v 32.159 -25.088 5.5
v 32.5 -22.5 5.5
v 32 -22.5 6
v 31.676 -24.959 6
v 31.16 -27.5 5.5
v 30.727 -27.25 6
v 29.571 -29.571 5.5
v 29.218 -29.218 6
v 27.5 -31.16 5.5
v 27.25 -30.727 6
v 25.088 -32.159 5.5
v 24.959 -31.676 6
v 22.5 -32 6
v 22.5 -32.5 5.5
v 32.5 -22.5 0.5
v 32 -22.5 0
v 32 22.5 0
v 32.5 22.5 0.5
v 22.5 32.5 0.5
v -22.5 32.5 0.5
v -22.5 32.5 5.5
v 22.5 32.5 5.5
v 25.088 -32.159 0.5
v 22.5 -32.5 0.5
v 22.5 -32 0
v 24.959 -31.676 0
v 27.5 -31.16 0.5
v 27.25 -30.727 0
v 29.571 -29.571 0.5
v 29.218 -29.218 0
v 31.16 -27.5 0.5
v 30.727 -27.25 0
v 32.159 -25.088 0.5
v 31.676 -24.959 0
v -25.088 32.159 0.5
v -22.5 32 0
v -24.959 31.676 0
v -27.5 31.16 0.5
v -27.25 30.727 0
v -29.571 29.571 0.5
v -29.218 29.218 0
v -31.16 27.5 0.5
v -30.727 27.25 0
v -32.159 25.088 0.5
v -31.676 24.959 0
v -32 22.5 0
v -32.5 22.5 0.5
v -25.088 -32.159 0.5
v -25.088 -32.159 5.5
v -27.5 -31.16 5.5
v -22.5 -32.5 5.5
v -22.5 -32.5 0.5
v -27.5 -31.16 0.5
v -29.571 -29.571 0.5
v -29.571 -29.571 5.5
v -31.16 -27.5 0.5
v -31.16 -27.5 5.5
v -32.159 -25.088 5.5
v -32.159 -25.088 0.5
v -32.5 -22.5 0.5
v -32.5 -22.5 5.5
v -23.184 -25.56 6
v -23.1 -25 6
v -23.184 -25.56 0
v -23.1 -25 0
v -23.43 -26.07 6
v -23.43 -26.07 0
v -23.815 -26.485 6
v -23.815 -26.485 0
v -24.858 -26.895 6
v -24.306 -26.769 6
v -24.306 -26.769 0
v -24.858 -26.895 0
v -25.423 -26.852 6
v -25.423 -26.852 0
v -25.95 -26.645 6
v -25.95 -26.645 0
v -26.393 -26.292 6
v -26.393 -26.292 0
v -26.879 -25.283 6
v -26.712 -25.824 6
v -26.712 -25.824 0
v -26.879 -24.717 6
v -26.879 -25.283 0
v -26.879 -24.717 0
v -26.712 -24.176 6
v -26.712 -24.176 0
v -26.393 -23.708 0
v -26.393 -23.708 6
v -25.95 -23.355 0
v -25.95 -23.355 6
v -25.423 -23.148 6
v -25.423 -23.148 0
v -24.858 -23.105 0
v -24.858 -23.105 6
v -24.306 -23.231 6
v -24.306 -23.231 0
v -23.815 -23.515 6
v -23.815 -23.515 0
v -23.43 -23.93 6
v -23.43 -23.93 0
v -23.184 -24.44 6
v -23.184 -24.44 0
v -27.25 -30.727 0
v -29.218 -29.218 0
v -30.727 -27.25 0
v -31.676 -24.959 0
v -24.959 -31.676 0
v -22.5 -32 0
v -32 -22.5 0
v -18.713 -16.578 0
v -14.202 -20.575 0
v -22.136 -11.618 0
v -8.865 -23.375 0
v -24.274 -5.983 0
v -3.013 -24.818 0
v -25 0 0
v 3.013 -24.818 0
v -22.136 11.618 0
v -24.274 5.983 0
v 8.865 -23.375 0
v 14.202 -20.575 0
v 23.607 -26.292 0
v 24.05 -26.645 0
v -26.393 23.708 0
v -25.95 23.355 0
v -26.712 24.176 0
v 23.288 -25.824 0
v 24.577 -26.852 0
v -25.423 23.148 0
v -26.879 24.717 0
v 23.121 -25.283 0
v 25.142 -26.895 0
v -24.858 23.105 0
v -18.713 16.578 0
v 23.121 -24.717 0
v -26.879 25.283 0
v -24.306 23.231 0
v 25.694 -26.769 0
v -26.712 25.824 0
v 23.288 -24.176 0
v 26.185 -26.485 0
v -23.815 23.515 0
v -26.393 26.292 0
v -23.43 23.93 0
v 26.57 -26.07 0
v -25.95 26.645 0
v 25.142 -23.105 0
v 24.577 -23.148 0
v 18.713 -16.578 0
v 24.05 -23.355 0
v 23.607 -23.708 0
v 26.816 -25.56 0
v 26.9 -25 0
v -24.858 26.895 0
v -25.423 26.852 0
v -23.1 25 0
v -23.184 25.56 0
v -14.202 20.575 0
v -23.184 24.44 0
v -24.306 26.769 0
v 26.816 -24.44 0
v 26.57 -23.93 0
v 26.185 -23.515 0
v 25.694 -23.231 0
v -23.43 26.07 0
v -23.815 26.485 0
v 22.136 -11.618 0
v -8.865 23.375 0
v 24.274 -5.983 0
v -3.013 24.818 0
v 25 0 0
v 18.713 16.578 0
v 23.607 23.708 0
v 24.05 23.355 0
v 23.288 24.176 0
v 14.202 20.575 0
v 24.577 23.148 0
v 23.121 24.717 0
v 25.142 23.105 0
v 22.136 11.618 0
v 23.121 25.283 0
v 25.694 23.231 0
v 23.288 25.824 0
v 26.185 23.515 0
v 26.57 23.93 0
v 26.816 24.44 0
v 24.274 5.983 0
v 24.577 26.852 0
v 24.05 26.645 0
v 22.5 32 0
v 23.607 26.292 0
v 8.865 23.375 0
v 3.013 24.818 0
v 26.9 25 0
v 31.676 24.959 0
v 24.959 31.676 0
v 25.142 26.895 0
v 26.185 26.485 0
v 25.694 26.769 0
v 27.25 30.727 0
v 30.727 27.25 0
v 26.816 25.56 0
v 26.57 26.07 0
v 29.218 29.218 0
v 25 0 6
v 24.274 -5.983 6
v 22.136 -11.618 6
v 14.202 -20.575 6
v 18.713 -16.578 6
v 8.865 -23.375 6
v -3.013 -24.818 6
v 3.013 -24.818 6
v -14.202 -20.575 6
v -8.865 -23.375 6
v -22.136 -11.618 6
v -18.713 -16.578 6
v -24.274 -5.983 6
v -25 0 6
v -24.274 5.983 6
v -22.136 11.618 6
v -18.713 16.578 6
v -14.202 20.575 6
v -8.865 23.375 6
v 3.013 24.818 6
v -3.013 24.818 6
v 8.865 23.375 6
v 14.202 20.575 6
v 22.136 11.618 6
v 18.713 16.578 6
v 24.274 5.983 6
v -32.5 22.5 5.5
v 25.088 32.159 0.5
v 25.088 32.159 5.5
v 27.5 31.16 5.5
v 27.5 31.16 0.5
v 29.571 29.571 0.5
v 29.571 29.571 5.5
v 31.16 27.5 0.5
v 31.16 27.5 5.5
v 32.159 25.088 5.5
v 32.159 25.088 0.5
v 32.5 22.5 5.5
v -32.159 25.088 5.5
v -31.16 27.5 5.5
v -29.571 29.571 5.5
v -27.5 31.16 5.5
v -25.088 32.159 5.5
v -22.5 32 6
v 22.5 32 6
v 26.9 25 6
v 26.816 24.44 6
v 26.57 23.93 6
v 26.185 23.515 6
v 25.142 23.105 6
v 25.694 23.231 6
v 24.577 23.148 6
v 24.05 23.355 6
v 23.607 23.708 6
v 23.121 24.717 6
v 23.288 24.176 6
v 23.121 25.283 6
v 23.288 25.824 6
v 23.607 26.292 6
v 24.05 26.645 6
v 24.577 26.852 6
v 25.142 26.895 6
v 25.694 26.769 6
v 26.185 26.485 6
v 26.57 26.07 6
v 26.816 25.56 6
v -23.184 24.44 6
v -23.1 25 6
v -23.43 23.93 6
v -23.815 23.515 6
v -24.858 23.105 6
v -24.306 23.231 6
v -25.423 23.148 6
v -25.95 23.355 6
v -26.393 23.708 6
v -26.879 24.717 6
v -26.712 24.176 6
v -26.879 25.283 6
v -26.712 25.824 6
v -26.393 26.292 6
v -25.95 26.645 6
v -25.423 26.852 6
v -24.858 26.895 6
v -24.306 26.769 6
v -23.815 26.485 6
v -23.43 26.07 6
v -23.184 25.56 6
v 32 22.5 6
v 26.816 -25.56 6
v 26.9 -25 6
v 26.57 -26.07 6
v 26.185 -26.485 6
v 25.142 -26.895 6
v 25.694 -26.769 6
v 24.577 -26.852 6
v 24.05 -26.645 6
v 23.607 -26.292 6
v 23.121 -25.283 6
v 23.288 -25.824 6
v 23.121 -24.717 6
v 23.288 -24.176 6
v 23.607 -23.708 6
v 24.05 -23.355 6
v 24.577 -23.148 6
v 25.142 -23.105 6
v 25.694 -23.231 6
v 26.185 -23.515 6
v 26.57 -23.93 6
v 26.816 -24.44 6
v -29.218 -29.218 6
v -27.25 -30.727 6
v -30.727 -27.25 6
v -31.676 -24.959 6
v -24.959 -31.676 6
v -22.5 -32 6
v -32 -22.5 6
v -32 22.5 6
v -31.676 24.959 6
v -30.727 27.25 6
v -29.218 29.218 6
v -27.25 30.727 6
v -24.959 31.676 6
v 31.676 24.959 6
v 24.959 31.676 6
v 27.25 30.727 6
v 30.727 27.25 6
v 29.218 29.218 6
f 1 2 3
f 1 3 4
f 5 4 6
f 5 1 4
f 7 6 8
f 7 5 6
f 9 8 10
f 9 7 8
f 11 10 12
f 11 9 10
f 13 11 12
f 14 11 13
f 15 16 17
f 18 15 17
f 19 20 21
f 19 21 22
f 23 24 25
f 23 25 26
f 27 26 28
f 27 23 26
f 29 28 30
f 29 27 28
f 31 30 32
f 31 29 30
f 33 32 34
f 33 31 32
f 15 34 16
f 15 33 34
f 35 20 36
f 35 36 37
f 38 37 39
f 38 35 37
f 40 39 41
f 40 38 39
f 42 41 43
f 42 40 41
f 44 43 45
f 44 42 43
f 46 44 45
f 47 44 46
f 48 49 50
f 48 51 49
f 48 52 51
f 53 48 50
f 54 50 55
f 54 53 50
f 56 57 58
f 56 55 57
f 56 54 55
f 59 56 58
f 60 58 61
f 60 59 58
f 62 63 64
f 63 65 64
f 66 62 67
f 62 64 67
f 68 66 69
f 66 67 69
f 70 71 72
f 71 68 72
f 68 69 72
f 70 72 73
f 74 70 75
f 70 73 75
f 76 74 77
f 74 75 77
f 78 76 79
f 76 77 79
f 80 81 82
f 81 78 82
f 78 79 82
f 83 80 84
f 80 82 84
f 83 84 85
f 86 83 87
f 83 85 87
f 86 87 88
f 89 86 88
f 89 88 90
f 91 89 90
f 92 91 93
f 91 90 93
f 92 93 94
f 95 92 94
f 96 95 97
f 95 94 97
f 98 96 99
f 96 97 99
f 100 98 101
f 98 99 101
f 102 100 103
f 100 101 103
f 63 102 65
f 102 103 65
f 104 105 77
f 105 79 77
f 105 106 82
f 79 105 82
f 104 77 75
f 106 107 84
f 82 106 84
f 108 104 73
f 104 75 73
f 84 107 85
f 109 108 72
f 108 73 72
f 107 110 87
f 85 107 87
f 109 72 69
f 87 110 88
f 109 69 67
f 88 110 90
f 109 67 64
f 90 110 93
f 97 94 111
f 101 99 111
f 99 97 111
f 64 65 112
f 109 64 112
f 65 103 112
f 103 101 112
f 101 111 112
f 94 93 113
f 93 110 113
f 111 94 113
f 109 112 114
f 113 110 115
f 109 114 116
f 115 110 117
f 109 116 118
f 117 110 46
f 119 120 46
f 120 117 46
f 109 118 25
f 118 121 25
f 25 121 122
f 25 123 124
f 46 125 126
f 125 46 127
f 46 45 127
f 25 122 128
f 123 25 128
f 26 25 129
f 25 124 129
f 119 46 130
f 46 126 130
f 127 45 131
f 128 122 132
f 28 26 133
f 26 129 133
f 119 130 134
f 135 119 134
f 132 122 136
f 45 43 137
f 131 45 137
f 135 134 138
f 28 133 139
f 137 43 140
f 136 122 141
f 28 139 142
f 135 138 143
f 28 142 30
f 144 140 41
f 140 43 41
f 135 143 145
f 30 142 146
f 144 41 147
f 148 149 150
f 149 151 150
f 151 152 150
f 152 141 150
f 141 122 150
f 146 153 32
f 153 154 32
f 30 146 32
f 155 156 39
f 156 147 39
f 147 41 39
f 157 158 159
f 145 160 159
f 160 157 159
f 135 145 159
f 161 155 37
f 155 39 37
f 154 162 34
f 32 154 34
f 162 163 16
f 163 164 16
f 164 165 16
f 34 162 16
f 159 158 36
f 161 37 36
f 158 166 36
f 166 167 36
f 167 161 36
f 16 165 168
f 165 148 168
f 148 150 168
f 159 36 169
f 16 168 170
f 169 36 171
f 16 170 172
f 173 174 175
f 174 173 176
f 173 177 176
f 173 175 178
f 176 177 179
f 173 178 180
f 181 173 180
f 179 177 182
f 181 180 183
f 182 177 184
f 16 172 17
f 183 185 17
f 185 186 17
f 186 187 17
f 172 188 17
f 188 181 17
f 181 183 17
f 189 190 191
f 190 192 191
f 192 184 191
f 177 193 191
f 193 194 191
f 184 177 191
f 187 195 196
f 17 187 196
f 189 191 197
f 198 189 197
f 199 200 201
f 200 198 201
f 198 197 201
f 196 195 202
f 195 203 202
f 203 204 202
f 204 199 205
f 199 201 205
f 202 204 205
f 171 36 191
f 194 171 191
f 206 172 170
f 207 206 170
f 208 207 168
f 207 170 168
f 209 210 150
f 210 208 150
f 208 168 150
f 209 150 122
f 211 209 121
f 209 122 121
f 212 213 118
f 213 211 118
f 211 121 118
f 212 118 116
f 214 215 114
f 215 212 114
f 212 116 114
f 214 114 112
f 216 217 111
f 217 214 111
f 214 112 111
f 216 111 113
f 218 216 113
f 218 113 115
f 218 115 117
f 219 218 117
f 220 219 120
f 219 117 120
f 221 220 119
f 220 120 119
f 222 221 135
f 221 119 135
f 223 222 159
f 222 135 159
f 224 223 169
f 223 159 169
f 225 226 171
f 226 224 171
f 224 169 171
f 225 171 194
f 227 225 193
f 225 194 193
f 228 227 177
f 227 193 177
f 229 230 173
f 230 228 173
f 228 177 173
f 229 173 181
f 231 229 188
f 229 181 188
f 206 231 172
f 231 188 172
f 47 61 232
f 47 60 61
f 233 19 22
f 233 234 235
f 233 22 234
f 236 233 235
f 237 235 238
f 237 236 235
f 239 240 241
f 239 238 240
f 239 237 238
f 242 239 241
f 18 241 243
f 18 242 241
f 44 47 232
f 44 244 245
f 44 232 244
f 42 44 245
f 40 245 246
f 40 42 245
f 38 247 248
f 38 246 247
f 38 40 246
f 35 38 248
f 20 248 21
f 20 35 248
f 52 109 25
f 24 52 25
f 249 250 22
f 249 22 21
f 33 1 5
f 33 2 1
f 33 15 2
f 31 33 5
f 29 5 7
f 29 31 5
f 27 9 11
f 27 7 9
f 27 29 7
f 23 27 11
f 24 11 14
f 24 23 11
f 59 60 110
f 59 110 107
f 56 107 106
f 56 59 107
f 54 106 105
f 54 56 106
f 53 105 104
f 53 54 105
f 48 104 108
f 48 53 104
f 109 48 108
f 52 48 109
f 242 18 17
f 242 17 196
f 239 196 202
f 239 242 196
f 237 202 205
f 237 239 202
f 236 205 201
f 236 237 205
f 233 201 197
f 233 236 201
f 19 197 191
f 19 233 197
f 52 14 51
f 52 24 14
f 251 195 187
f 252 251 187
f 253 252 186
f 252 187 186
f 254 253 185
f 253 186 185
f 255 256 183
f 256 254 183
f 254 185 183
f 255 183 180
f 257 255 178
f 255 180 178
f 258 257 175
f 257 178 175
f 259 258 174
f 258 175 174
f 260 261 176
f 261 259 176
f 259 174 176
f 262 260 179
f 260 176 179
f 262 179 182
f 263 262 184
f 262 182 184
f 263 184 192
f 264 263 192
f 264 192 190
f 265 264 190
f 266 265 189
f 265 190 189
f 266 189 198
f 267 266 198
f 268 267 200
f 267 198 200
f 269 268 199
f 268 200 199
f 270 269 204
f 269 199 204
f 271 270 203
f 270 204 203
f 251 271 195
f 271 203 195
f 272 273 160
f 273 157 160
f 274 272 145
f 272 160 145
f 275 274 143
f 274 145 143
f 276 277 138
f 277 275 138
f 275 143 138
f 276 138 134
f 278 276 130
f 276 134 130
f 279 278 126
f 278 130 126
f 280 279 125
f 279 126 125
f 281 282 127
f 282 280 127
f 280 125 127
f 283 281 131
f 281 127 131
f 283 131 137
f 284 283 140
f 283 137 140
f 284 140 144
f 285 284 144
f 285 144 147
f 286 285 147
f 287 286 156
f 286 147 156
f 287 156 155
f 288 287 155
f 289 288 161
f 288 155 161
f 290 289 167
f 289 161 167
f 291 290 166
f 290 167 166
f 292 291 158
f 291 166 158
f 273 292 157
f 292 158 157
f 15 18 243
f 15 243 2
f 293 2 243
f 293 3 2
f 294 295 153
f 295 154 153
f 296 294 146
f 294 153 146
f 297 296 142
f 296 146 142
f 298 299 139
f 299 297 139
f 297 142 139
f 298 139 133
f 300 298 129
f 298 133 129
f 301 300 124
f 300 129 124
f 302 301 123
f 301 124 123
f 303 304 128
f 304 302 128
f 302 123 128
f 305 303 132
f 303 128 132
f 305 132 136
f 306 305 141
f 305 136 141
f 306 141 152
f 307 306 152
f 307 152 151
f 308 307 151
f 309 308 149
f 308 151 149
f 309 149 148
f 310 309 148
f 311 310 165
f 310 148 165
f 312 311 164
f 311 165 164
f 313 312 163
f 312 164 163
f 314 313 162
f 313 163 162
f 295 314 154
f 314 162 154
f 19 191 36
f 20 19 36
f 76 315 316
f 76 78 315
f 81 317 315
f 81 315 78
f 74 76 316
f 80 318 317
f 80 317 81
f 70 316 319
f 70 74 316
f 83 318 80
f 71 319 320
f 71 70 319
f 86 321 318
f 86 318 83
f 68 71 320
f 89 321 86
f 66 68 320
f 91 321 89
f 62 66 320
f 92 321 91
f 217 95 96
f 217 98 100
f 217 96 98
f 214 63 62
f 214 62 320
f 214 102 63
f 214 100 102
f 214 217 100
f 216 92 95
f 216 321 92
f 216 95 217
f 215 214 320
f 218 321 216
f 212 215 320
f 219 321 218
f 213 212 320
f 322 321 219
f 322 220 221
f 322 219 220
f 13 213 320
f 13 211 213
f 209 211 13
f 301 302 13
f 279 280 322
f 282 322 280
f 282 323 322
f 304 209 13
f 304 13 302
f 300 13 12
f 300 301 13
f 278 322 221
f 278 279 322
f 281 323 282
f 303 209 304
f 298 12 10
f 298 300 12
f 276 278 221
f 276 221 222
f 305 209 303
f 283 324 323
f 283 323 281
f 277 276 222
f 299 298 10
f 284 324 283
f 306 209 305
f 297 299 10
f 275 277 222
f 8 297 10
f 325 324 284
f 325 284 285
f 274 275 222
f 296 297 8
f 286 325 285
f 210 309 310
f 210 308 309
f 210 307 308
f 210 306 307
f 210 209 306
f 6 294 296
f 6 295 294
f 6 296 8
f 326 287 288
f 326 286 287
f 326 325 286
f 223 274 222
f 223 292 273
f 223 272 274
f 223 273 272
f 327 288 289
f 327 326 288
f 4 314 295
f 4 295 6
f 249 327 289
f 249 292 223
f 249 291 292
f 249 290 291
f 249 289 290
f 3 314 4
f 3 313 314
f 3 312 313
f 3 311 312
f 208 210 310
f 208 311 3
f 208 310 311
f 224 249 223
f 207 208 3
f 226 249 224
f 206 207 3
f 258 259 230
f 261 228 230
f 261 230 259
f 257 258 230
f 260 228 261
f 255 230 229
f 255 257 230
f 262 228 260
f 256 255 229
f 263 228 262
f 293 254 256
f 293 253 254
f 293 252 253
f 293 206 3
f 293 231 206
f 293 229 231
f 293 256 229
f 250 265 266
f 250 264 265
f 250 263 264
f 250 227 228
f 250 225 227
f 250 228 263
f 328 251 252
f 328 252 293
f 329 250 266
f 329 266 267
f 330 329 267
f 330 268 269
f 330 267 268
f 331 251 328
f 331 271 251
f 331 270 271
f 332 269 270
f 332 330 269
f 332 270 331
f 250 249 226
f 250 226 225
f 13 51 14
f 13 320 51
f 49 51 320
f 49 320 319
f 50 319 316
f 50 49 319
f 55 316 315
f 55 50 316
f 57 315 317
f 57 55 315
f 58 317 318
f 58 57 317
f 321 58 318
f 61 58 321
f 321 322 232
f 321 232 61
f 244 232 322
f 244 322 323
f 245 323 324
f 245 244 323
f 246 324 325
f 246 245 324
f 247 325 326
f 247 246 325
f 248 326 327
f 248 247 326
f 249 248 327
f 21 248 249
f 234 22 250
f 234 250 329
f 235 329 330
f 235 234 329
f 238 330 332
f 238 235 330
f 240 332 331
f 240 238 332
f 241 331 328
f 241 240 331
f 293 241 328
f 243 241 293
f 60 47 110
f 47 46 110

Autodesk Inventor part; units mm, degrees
ref_plane "YZ Plane" through (0, 0, 0) normal (1, 0, 0) x (0, 1, 0)
ref_plane "XZ Plane" through (0, 0, 0) normal (0, 1, 0) x (-1, 0, 0)
ref_plane "XY Plane" through (0, 0, 0) normal (0, 0, 1) x (1, 0, 0)
sketch "Skizze1" plane through (0, 0, 0) normal (0, 0, 1) x (1, 0, 0)
  circle A0 centre (0, 0) radius 25
  line L0 (-32.5, 32.5) -> (32.5, 32.5)
  line L1 (32.5, 22.5) -> (32.5, -22.5)
  line L2 (22.5, -32.5) -> (-22.5, -32.5)
  line L3 (-32.5, -22.5) -> (-32.5, 22.5)
  line L4 (-32.5, 32.5) -> (32.5, -32.5) construction
  line L5 (32.5, 32.5) -> (-32.5, -32.5) construction
  circle A1 centre (-25, 25) radius 1.9
  circle A2 centre (25, 25) radius 1.9
  circle A3 centre (-25, -25) radius 1.9
  circle A4 centre (25, -25) radius 1.9
  line L6 (-22.5, 32.5) -> (22.5, 32.5)
  line L7 (32.5, -32.5) -> (-32.5, -32.5)
  line L8 (-32.5, -32.5) -> (-32.5, 32.5)
  line L9 (32.5, 32.5) -> (32.5, -32.5)
  arc A5 (-22.5, 32.5) -> (-32.5, 22.5) centre (-22.5, 22.5) ccw
  arc A6 (-32.5, -22.5) -> (-22.5, -32.5) centre (-22.5, -22.5) ccw
  arc A7 (22.5, -32.5) -> (32.5, -22.5) centre (22.5, -22.5) ccw
  arc A8 (32.5, 22.5) -> (22.5, 32.5) centre (22.5, 22.5) ccw
  dimension "d0" = 50
  dimension "d1" = 65
  dimension "d2" = 65
  dimension "d5" = 25
  dimension "d6" = 25
  dimension "d7" = 3.8
  dimension "d10" = 50
  dimension "d13" = 50
  dimension "d16" = 10
extrude "Extrusion1" add sketch "Skizze1" along normal blind 6 contours L0 A8 L1 A7 L2 A6 L3 A5
chamfer "Fase1" distance 0.5 angle 45 16 edges at (29.5711, 29.5711, 0) (0, 32.5, 0) (-29.5711, 29.5711, 0) (-32.5, 0, 0) (-29.5711, -29.5711, 0) (0, -32.5, 0) (29.5711, -29.5711, 0) (32.5, 0, 0) (29.5711, 29.5711, 6) (0, 32.5, 6) (-29.5711, 29.5711, 6) (-32.5, 0, 6) (-29.5711, -29.5711, 6) (0, -32.5, 6) (29.5711, -29.5711, 6) (32.5, 0, 6)
properties part number "StageInsert_FoilHolder_Part2"
